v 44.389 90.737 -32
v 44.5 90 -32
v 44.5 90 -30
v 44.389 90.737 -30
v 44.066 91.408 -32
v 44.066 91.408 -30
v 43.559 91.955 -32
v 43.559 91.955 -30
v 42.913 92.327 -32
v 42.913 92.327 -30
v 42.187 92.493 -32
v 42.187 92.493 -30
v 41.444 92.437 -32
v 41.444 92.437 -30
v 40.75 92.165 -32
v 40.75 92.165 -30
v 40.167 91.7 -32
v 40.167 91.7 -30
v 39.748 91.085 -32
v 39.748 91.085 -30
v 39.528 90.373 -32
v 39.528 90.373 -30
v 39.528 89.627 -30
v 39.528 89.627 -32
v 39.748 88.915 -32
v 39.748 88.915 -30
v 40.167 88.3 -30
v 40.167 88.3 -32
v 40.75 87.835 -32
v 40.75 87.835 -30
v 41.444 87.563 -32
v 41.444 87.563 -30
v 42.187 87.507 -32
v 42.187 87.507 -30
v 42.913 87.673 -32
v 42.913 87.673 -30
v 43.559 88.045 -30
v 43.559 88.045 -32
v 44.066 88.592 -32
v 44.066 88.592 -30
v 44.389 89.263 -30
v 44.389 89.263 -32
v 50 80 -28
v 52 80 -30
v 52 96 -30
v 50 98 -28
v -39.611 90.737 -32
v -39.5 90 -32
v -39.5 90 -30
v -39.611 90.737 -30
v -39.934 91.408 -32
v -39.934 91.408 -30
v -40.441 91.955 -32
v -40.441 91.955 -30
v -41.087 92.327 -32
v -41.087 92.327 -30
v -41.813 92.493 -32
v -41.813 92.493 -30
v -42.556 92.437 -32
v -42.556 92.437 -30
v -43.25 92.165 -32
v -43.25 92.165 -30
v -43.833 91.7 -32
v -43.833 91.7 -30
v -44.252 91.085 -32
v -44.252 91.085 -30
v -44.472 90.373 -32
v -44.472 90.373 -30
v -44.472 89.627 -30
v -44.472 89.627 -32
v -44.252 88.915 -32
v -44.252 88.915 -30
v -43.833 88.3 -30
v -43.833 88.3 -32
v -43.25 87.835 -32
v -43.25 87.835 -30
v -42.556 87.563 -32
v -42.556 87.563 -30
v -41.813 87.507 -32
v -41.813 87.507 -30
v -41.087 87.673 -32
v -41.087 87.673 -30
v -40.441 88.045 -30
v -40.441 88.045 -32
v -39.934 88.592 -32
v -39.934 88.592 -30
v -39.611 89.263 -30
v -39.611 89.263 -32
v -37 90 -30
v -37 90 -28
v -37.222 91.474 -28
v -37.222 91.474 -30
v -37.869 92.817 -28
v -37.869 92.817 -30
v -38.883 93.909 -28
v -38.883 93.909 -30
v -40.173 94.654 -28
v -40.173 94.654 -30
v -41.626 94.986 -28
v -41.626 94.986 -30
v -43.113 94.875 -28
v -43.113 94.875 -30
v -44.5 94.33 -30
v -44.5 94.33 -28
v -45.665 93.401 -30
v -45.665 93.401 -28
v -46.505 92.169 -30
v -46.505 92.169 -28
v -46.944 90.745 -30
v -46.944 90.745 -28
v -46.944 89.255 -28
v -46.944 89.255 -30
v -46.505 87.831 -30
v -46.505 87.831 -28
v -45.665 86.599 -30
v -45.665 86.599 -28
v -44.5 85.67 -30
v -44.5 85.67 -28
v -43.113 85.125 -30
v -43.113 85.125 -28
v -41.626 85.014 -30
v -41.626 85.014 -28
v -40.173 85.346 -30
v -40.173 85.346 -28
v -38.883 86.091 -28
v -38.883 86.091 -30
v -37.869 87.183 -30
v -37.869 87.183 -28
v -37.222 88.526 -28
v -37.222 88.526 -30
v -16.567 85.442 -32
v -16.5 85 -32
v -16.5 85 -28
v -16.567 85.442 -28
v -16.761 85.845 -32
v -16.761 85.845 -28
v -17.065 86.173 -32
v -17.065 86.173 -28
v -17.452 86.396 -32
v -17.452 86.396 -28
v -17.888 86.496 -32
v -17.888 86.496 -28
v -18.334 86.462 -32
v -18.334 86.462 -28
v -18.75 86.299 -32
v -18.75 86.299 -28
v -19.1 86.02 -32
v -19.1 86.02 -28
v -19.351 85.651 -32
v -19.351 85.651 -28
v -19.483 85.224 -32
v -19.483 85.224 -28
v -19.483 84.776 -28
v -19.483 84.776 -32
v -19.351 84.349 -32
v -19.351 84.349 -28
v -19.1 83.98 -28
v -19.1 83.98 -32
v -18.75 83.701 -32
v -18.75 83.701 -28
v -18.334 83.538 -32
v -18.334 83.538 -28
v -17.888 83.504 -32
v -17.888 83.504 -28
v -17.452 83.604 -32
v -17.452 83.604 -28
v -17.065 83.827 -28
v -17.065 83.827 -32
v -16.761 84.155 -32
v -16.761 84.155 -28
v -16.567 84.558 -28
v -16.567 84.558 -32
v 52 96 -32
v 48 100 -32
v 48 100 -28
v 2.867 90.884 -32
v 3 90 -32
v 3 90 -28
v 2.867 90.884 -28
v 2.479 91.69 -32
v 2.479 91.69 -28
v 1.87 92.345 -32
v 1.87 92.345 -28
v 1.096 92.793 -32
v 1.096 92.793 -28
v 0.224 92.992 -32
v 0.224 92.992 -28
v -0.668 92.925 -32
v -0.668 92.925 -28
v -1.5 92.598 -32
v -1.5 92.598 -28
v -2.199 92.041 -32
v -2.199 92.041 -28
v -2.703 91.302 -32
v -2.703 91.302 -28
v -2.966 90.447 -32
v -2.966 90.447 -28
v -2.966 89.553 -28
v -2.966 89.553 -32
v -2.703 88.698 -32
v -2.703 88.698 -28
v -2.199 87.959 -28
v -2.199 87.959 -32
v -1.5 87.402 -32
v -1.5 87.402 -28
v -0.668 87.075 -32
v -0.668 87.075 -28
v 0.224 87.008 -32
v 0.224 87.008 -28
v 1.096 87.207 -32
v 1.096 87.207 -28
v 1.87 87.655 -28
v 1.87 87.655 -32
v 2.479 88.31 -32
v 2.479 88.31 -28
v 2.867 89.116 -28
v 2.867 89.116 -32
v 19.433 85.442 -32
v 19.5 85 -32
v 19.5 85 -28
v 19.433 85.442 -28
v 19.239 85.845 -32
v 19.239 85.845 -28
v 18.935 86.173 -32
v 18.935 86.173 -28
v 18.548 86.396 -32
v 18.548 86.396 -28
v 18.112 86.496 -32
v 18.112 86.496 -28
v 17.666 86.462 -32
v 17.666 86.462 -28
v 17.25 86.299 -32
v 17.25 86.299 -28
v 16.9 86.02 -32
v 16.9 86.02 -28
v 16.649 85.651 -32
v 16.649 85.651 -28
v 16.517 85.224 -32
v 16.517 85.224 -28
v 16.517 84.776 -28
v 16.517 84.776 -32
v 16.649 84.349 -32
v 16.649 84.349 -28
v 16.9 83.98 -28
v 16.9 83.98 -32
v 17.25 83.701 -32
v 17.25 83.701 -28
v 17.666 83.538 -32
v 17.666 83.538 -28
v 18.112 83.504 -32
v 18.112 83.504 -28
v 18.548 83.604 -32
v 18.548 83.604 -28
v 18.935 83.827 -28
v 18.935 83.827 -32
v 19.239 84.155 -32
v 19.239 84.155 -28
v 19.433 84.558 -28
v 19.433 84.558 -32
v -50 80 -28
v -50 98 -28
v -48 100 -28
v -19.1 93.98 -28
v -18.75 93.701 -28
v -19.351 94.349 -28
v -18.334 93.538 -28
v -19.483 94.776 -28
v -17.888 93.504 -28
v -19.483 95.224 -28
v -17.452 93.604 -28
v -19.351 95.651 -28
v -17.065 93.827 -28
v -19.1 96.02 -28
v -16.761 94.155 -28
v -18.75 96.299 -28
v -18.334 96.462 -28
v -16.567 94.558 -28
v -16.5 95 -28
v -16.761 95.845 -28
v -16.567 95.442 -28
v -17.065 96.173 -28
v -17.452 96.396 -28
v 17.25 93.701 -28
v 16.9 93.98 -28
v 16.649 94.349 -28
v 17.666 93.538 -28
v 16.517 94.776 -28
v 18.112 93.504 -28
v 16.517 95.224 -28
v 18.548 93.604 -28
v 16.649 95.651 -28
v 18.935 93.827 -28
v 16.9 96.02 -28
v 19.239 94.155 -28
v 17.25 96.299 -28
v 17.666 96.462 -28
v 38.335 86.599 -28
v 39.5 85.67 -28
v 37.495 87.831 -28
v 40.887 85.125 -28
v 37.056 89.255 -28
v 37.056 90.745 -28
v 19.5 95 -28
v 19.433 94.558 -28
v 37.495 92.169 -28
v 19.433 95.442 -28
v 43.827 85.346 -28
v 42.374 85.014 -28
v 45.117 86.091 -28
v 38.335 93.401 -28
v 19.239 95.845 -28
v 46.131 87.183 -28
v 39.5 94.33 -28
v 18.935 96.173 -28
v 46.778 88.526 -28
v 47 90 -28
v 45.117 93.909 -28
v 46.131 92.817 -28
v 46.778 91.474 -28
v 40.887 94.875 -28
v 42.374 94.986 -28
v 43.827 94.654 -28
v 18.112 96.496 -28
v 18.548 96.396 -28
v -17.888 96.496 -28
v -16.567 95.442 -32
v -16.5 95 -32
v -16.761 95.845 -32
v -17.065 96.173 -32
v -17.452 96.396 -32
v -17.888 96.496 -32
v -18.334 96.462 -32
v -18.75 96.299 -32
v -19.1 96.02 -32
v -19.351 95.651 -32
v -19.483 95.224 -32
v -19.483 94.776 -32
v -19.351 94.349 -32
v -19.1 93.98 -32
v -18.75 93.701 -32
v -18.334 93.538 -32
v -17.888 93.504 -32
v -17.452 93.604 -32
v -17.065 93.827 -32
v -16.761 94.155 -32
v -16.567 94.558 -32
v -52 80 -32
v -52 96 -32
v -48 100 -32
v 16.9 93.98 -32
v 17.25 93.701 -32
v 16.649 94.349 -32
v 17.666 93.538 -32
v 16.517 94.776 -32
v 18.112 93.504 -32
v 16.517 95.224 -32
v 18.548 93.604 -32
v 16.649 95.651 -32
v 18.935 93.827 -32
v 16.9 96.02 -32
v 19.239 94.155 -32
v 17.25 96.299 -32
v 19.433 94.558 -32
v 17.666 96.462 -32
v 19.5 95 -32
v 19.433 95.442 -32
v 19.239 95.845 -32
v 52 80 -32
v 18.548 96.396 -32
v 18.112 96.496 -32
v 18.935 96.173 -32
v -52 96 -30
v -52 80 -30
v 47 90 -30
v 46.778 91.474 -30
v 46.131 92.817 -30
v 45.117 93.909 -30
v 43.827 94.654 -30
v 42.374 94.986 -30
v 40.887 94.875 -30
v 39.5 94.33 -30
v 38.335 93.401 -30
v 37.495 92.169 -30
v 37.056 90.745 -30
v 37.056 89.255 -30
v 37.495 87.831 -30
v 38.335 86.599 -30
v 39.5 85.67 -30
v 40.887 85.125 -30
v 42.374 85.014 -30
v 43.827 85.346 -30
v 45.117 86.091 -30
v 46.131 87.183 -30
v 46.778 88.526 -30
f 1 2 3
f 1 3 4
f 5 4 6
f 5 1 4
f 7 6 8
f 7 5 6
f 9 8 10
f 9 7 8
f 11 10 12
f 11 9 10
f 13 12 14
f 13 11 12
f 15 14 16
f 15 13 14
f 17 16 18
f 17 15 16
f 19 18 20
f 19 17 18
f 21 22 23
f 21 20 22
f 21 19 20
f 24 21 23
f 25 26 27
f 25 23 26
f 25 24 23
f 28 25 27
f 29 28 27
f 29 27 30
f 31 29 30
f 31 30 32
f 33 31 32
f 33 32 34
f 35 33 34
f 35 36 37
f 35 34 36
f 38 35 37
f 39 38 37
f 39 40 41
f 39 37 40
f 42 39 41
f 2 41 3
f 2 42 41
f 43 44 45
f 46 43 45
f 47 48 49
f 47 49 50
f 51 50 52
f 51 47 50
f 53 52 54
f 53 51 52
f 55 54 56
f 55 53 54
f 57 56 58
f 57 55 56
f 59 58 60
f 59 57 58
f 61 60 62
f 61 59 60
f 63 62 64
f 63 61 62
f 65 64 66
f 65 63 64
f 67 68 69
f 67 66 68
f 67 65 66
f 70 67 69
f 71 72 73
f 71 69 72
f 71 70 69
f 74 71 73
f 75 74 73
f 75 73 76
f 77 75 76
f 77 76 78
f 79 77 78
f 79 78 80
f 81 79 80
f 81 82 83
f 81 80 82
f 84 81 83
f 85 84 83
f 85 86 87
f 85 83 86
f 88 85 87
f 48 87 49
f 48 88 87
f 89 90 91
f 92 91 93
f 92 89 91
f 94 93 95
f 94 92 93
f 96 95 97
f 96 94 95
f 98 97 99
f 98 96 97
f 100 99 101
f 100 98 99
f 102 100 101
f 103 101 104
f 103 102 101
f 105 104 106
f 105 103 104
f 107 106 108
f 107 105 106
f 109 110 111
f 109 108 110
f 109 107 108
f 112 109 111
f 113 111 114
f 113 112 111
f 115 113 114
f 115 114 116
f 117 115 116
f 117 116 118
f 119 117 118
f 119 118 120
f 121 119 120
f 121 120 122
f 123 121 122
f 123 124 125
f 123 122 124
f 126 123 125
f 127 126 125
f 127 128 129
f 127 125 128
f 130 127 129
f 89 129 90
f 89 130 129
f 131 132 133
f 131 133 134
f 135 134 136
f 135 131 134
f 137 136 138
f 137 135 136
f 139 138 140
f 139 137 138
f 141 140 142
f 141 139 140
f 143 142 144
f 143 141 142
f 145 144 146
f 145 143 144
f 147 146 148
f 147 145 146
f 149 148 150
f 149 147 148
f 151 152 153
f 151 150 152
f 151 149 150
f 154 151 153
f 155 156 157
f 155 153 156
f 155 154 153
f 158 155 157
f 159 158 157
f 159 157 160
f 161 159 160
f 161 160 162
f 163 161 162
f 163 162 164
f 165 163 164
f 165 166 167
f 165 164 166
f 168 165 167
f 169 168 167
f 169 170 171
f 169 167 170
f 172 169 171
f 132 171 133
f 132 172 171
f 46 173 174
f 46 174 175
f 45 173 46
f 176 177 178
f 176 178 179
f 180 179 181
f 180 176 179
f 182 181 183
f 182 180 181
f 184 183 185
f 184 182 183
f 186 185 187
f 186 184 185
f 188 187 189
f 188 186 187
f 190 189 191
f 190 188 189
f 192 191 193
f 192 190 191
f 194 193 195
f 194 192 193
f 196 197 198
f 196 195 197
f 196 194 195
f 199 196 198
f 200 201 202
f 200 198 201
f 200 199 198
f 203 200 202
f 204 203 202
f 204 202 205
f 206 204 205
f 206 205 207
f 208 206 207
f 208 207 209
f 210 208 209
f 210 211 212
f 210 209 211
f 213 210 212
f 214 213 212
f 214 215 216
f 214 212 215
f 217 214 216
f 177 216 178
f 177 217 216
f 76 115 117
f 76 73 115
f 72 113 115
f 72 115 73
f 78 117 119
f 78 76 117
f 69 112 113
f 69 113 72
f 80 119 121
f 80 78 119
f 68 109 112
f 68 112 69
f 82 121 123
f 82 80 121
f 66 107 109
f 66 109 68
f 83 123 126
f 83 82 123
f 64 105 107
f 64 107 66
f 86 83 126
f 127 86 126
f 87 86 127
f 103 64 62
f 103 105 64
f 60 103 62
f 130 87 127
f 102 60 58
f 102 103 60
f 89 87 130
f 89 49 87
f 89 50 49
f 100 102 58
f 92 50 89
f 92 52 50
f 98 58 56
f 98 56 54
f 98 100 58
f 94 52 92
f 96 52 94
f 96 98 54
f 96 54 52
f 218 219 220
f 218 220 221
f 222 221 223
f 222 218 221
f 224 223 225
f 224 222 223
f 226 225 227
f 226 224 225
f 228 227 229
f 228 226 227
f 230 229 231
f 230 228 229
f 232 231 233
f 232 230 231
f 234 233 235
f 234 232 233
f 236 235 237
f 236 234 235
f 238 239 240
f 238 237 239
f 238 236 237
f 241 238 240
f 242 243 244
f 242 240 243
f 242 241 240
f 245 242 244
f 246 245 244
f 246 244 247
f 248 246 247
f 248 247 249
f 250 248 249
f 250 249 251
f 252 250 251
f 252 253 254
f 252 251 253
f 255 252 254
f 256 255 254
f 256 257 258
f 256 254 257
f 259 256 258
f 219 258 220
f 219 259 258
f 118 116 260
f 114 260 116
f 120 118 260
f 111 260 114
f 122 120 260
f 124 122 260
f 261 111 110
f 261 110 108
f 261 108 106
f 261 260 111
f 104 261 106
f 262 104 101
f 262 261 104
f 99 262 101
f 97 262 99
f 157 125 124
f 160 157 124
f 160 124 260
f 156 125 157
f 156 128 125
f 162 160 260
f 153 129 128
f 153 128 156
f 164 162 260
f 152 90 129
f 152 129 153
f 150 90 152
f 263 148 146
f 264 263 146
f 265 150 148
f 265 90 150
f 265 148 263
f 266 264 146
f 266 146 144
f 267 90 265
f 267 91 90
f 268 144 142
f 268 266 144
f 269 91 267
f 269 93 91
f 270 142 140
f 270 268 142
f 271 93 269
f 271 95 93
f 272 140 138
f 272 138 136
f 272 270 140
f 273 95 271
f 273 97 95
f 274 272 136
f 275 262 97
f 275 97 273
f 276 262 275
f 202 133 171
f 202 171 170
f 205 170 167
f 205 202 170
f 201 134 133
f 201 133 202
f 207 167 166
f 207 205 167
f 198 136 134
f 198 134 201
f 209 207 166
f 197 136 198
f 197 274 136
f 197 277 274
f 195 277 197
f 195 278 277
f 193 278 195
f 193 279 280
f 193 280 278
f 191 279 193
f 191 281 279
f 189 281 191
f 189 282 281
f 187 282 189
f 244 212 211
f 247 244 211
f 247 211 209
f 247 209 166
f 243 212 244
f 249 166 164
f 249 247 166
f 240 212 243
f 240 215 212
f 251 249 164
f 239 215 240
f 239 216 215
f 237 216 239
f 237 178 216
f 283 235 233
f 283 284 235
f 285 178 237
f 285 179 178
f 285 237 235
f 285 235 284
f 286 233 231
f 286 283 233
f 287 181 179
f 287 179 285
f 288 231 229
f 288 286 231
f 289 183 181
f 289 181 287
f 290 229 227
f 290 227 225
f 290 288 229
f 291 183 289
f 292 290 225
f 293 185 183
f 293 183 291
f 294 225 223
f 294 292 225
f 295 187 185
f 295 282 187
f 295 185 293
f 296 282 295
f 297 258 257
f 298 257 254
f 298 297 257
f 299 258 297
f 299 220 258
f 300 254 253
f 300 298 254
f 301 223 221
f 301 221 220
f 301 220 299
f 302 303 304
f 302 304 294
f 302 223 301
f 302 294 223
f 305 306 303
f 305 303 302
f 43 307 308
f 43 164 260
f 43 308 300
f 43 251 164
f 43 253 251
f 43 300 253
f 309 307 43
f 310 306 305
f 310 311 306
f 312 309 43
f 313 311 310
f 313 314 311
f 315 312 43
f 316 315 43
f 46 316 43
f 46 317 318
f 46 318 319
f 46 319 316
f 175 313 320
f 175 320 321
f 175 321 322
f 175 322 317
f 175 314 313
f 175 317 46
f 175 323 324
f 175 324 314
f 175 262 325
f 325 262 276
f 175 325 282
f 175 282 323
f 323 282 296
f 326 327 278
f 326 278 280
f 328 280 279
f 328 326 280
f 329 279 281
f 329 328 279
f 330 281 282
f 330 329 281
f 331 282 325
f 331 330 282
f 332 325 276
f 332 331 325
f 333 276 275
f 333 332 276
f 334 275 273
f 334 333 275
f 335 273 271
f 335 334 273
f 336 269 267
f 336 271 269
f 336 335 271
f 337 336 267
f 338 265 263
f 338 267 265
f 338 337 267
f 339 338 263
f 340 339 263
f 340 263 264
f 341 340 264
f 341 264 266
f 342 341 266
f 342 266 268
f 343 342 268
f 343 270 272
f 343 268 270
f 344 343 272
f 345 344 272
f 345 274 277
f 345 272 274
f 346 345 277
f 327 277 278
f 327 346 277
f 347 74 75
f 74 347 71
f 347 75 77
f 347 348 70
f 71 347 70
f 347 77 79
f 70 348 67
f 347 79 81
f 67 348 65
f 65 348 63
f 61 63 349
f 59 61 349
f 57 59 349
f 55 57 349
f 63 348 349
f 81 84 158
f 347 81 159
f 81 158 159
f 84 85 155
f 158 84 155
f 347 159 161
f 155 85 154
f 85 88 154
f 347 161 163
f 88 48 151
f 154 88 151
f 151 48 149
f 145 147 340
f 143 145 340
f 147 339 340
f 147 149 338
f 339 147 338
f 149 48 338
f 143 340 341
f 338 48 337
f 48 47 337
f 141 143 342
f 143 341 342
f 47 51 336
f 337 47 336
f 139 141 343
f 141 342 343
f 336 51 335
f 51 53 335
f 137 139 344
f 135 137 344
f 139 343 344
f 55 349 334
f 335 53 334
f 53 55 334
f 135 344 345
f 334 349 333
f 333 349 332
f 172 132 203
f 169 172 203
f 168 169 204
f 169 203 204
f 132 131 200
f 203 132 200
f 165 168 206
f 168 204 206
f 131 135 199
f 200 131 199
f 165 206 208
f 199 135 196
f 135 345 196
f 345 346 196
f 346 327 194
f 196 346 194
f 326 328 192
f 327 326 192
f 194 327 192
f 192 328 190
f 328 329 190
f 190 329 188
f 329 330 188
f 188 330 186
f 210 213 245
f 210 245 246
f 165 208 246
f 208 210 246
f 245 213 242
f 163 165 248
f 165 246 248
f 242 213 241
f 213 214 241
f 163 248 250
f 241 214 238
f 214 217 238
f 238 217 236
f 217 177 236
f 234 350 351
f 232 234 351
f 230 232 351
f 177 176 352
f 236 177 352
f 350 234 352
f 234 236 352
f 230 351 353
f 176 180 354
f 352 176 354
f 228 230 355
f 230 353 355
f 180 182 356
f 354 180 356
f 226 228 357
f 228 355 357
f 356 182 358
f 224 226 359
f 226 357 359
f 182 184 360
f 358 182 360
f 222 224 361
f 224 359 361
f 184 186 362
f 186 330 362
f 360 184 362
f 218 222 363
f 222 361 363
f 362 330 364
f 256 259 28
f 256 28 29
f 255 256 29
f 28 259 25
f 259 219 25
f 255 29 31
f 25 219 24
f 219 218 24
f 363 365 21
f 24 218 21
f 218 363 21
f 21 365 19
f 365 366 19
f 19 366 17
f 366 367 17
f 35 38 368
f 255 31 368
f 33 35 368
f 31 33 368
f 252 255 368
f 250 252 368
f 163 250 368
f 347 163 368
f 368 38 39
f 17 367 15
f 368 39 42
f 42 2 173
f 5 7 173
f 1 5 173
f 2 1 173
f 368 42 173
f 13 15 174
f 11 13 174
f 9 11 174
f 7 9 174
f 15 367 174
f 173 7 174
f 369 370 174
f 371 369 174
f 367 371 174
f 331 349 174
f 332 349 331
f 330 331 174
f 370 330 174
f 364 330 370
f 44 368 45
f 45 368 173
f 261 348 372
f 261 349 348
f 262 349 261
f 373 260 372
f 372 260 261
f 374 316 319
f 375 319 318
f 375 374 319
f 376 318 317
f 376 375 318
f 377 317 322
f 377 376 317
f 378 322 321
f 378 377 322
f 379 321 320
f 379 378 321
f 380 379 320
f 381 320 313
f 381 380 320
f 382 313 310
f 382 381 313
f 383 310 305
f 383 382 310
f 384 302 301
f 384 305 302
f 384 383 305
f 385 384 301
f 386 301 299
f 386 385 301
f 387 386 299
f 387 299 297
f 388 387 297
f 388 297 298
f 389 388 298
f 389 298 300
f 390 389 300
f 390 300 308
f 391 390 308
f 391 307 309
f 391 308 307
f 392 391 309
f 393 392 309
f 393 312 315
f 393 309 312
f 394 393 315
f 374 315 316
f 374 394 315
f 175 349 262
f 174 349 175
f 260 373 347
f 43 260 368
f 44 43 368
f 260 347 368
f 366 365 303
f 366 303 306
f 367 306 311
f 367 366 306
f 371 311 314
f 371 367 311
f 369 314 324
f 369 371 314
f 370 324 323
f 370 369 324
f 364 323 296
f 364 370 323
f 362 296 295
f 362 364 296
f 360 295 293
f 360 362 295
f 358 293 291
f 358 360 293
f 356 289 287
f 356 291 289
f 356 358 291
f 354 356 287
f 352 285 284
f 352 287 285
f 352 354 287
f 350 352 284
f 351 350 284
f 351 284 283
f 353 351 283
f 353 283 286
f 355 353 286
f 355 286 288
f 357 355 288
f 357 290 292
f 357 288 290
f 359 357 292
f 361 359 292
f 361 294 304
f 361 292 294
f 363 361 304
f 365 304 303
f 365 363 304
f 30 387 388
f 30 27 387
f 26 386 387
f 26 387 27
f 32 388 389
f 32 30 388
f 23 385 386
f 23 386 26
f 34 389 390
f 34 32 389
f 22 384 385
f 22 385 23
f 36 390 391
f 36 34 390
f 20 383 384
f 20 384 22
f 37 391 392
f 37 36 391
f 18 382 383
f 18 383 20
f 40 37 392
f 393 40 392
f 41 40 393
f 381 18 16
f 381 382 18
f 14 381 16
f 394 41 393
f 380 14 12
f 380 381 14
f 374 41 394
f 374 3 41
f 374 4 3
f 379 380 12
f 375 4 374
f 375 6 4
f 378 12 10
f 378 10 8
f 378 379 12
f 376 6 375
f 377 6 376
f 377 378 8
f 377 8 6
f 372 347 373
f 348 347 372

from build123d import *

# Parameters (mm, degrees)
CYLINDER1716_R     = 2.5
CYLINDER1716_DEPTH = 20
CYLINDER1717_R     = 2.5
CYLINDER1717_DEPTH = 20
CYLINDER1715_R     = 5
CYLINDER1715_DEPTH = 5
CYLINDER1718_R     = 5
CYLINDER1718_DEPTH = 5
CYLINDER1711_R     = 1.5
CYLINDER1711_DEPTH = 60
CYLINDER1712_R     = 1.5
CYLINDER1712_DEPTH = 60
CYLINDER1713_R     = 1.5
CYLINDER1713_DEPTH = 60
CYLINDER1714_R     = 1.5
CYLINDER1714_DEPTH = 60
CYLINDER1701_R     = 3
CYLINDER1701_DEPTH = 48
BOX659_W           = 104
BOX659_H           = 20
BOX659_DEPTH       = 4
CHAMFER057_SIZE    = 4
CHAMFER058_SIZE    = 2


with BuildPart() as v_lec1716:
    # Cylinder1716 → Cylinder1716 (new body)
    with BuildSketch(Plane(origin=(-42, 90, -59), x_dir=(1, 0, 0), z_dir=(0, 0, 1))):
        Circle(CYLINDER1716_R)
    extrude(amount=CYLINDER1716_DEPTH)


with BuildPart() as compound845:
    # Cylinder1717 → Cylinder1717 (new body)
    with BuildSketch(Plane(origin=(42, 90, -59), x_dir=(1, 0, 0), z_dir=(0, 0, 1))):
        Circle(CYLINDER1717_R)
    extrude(amount=CYLINDER1717_DEPTH)

    # Compound845: union Válec1716
    add(v_lec1716.part)


with BuildPart() as compound845_1:
    # Compound845 placement: moved
    add(compound845.part.moved(Location((0, 0, 18))))


with BuildPart() as v_lec1715:
    # Cylinder1715 → Cylinder1715 (new body)
    with BuildSketch(Plane(origin=(-42, 90, -59), x_dir=(1, 0, 0), z_dir=(0, 0, 1))):
        Circle(CYLINDER1715_R)
    extrude(amount=CYLINDER1715_DEPTH)


with BuildPart() as compound844:
    # Cylinder1718 → Cylinder1718 (new body)
    with BuildSketch(Plane(origin=(42, 90, -59), x_dir=(1, 0, 0), z_dir=(0, 0, 1))):
        Circle(CYLINDER1718_R)
    extrude(amount=CYLINDER1718_DEPTH)

    # Compound844: union Válec1715
    add(v_lec1715.part)


with BuildPart() as compound844_1:
    # Compound844 placement: moved
    add(compound844.part.moved(Location((0, 0, 29))))


with BuildPart() as v_lec1711:
    # Cylinder1711 → Cylinder1711 (new body)
    with BuildSketch(Plane(origin=(18, 85, -57), x_dir=(1, 0, 0), z_dir=(0, 0, 1))):
        Circle(CYLINDER1711_R)
    extrude(amount=CYLINDER1711_DEPTH)


with BuildPart() as v_lec1712:
    # Cylinder1712 → Cylinder1712 (new body)
    with BuildSketch(Plane(origin=(-18, 85, -57), x_dir=(1, 0, 0), z_dir=(0, 0, 1))):
        Circle(CYLINDER1712_R)
    extrude(amount=CYLINDER1712_DEPTH)


with BuildPart() as v_lec1713:
    # Cylinder1713 → Cylinder1713 (new body)
    with BuildSketch(Plane(origin=(-18, 95, -57), x_dir=(1, 0, 0), z_dir=(0, 0, 1))):
        Circle(CYLINDER1713_R)
    extrude(amount=CYLINDER1713_DEPTH)


with BuildPart() as compound847:
    # Cylinder1714 → Cylinder1714 (new body)
    with BuildSketch(Plane(origin=(18, 95, -57), x_dir=(1, 0, 0), z_dir=(0, 0, 1))):
        Circle(CYLINDER1714_R)
    extrude(amount=CYLINDER1714_DEPTH)

    # Compound847: union Válec1711, Válec1712, Válec1713
    add(v_lec1711.part)
    add(v_lec1712.part)
    add(v_lec1713.part)


with BuildPart() as v_lec1701:
    # Cylinder1701 → Cylinder1701 (new body)
    with BuildSketch(Plane(origin=(0, 90, -55), x_dir=(1, 0, 0), z_dir=(0, 0, 1))):
        Circle(CYLINDER1701_R)
    extrude(amount=CYLINDER1701_DEPTH)


with BuildPart() as chamfer058:
    # Box659 → Box659 (new body)
    with BuildSketch(Plane(origin=(-52, 80, -32), x_dir=(1, 0, 0), z_dir=(0, 0, 1))):
        with Locations((52, 10)):
            Rectangle(BOX659_W, BOX659_H)
    extrude(amount=BOX659_DEPTH)

    # Cut345: cut Válec1701
    add(v_lec1701.part, mode=Mode.SUBTRACT)

    # Cut351: cut Compound847
    add(compound847.part, mode=Mode.SUBTRACT)

    # Cut353: cut Compound844
    add(compound844_1.part, mode=Mode.SUBTRACT)

    # Cut350: cut Compound845
    add(compound845_1.part, mode=Mode.SUBTRACT)

    # Chamfer057
    chamfer057_edges = [chamfer058.edges().sort_by_distance(p)[0] for p in [
        (-52, 100, -30),
        (52, 100, -30),
    ]]
    chamfer(chamfer057_edges, length=CHAMFER057_SIZE)

    # Chamfer058
    chamfer058_edges = [chamfer058.edges().sort_by_distance(p)[0] for p in [
        (-52, 88, -28),
        (52, 88, -28),
    ]]
    chamfer(chamfer058_edges, length=CHAMFER058_SIZE)


solid = chamfer058.part
